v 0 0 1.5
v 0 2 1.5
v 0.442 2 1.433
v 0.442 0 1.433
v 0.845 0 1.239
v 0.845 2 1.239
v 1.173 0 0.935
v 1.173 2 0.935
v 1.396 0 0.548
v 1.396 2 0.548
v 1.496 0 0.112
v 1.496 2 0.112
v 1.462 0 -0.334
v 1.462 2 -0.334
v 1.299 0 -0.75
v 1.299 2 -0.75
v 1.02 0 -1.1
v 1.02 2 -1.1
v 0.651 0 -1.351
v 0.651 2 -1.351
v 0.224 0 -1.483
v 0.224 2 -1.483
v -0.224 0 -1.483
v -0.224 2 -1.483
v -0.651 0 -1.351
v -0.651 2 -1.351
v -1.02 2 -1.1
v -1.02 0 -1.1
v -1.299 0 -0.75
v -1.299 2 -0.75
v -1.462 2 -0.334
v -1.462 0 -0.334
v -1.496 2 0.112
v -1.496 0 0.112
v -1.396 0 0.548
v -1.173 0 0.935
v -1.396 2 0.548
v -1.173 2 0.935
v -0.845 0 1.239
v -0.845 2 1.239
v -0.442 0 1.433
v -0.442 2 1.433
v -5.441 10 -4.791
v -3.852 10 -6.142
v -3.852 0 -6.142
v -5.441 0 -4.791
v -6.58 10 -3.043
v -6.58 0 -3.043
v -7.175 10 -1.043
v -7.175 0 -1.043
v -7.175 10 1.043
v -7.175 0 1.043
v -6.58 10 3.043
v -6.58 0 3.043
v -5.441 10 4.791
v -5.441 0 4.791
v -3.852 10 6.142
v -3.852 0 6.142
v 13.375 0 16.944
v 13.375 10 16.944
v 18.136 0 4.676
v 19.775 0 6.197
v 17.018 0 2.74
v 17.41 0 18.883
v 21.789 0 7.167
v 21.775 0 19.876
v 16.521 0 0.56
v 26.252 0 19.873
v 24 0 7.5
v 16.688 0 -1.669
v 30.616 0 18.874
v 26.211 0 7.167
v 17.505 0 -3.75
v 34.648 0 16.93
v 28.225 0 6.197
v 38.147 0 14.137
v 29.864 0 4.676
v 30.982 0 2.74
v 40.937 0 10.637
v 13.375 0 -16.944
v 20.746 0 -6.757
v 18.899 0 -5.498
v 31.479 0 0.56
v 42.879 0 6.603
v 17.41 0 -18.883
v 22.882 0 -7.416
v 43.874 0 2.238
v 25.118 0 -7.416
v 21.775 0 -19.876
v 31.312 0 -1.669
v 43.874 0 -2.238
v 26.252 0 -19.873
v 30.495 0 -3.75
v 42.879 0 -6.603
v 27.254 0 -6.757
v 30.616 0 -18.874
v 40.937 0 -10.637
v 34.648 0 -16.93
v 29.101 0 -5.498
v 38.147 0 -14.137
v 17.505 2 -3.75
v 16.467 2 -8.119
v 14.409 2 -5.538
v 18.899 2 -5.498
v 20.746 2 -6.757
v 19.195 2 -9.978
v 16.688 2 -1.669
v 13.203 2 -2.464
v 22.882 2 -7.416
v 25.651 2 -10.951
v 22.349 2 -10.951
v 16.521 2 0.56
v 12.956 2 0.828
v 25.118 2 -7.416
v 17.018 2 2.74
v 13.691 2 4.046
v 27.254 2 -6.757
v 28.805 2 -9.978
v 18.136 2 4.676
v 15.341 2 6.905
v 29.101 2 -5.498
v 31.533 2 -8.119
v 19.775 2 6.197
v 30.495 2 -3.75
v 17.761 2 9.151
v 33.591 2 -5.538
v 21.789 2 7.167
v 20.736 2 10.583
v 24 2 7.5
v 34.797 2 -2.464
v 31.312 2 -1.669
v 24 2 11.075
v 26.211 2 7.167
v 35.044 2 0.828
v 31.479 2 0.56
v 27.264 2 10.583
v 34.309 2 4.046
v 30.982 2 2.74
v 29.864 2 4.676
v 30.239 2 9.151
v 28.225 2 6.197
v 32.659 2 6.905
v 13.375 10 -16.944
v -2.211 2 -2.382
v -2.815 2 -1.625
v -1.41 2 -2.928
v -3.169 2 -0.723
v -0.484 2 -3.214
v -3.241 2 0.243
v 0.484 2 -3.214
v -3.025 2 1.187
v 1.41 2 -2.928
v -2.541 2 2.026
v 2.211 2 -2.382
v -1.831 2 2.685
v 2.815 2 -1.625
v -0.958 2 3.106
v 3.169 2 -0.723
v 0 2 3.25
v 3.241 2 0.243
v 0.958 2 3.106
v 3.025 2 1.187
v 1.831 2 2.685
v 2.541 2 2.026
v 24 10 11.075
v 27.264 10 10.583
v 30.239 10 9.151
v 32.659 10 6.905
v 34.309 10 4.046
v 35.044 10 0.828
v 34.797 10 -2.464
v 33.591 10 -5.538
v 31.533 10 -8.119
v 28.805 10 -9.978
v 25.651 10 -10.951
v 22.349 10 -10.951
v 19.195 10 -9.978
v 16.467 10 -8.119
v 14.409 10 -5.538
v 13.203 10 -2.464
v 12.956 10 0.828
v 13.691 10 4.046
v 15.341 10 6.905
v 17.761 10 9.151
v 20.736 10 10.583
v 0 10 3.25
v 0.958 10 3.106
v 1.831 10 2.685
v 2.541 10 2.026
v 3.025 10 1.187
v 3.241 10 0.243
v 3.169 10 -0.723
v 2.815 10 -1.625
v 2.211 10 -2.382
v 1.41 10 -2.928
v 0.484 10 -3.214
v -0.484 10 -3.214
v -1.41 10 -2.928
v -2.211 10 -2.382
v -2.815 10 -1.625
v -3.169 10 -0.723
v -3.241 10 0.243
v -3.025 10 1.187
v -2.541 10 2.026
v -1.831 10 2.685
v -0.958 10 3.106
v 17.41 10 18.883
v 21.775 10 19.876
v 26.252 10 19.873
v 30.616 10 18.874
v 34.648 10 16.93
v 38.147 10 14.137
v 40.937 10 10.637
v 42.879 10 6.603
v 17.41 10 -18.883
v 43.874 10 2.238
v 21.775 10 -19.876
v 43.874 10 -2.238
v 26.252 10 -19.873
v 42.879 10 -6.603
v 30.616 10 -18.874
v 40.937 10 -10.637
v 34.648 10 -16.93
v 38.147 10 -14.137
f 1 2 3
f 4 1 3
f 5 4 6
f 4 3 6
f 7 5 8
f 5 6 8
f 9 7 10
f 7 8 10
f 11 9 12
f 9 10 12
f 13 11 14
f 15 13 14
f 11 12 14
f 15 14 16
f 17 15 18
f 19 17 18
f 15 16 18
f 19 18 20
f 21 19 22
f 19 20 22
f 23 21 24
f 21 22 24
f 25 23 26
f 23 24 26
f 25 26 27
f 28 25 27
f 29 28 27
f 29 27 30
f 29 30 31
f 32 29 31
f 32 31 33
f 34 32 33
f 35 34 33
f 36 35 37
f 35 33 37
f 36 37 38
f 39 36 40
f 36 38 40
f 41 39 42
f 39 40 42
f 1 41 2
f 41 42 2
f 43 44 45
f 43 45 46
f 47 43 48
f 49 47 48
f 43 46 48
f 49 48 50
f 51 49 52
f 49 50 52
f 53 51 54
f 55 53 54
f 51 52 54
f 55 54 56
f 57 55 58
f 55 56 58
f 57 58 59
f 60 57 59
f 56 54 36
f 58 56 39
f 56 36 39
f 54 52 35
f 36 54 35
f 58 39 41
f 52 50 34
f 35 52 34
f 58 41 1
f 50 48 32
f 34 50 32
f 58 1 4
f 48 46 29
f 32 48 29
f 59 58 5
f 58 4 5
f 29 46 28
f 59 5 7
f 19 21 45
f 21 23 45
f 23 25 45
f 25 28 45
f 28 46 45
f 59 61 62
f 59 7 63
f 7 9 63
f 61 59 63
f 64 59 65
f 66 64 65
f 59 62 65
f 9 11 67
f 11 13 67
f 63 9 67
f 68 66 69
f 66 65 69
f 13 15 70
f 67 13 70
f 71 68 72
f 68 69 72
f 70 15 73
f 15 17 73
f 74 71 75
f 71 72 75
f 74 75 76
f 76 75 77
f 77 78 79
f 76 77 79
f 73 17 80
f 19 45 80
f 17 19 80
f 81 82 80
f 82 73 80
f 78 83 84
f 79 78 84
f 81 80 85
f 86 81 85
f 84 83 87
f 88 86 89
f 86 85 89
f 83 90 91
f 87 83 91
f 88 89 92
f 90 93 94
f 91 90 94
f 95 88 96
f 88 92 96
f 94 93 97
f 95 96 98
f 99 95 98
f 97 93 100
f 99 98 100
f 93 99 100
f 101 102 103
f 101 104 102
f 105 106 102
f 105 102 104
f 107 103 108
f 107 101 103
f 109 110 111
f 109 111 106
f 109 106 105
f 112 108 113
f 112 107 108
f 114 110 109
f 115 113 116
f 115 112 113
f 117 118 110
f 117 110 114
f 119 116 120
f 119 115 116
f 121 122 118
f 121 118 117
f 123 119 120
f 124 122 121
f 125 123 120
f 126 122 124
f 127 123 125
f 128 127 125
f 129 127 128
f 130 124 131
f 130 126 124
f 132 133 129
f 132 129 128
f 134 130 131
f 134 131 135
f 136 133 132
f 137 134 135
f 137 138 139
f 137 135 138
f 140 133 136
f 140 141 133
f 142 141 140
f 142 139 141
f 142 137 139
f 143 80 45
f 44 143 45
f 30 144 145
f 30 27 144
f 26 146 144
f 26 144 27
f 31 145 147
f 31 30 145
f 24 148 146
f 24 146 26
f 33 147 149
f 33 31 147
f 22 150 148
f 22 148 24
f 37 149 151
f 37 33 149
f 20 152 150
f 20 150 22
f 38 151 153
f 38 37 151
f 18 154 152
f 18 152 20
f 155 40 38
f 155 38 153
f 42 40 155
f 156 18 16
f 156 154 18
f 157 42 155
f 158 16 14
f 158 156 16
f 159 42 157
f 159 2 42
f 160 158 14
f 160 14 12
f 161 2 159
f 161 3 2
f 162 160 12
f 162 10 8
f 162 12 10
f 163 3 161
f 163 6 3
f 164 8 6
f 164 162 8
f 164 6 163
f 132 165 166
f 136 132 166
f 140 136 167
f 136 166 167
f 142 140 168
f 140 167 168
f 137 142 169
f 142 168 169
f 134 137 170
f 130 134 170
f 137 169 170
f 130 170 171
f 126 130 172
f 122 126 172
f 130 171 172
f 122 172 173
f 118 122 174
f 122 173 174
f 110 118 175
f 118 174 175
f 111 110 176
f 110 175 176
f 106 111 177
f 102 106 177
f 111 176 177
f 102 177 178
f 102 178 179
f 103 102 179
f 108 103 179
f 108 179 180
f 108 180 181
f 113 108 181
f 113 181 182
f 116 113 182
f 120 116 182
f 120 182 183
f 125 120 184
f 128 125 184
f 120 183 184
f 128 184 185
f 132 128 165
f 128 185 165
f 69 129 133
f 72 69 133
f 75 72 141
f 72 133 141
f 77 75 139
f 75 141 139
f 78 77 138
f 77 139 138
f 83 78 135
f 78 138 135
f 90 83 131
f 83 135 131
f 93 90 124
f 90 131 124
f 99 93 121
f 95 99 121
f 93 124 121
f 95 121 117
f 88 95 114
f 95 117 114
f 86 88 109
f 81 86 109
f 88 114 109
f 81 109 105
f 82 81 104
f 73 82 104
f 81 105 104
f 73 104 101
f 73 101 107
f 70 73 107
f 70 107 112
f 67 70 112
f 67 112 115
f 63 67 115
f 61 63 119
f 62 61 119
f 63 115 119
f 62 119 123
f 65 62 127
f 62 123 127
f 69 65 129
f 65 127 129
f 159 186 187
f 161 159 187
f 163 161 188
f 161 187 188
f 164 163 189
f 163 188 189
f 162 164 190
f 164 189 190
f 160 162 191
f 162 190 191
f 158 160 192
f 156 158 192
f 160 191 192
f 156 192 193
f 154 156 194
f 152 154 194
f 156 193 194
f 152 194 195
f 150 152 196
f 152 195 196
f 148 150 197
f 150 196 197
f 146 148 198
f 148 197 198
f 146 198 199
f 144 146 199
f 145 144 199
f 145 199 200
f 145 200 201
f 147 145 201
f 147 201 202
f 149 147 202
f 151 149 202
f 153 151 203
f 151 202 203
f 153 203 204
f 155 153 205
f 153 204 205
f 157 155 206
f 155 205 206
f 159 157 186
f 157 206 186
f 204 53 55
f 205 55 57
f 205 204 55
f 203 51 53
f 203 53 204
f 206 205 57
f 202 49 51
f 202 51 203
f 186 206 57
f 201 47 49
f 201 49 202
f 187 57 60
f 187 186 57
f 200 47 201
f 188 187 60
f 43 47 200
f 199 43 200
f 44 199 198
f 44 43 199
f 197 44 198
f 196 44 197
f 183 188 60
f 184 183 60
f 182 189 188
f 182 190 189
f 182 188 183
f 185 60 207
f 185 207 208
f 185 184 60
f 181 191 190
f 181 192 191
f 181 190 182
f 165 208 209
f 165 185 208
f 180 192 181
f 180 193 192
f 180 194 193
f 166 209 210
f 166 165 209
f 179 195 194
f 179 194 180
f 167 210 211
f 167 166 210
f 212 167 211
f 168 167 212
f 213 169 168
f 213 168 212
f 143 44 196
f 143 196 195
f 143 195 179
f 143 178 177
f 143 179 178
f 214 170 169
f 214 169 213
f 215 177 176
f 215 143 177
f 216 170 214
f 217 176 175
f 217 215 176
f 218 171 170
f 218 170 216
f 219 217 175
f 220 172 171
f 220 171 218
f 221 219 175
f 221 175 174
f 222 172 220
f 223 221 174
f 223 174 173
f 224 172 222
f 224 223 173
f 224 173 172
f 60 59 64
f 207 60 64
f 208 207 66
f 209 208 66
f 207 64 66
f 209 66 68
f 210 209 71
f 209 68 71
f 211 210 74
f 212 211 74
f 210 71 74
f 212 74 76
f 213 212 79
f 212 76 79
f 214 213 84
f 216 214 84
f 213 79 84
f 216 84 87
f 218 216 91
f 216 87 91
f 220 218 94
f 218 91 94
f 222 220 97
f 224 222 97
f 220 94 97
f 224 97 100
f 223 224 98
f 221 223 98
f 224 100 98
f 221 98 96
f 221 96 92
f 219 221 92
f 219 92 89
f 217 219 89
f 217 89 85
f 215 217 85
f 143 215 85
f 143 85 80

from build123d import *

# Parameters (mm, degrees)
AUFSATZ_LINEAR_AUSTRAGEN1_DEPTH = 10
SKIZZE2_R                       = 3.25
SKIZZE2_R_2                     = 11.075
SCHNITT_LINEAR_AUSTRAGEN1_DEPTH = 8
SKIZZE3_R                       = 7.5
SKIZZE3_R_2                     = 1.5
SCHNITT_LINEAR_AUSTRAGEN2_DEPTH = 2


with BuildPart() as part:
    # Skizze1 → Aufsatz-Linear austragen1 (new body)
    with BuildSketch(Plane(origin=(0, 0, 0), x_dir=(1, 0, 0), z_dir=(0, 1, 0))):
        with BuildLine():
            Line((-3.8515625, -6.142309526), (13.375, -16.94430214))
            ThreePointArc((13.375, -16.94430214), (44, 0), (13.375, 16.94430214))
            Line((13.375, 16.94430214), (-3.8515625, 6.142309526))
            ThreePointArc((-3.8515625, 6.142309526), (-7.25, 0), (-3.8515625, -6.142309526))
        make_face()
    extrude(amount=AUFSATZ_LINEAR_AUSTRAGEN1_DEPTH)

    # Skizze2 → Schnitt-Linear austragen1 (cut)
    with BuildSketch(Plane(origin=(0, 10, 0), x_dir=(1, 0, 0), z_dir=(0, 1, 0))):
        with Locations(Location((0, 0, 0), (0, 0, 270))):
            Circle(SKIZZE2_R)
        with Locations(Location((24, 0, 0), (0, 0, 270))):
            Circle(SKIZZE2_R_2)
    extrude(amount=-SCHNITT_LINEAR_AUSTRAGEN1_DEPTH, mode=Mode.SUBTRACT)

    # Skizze3 → Schnitt-Linear austragen2 (cut)
    with BuildSketch(Plane(origin=(0, 2, 0), x_dir=(1, 0, 0), z_dir=(0, 1, 0))):
        with Locations(Location((24, 0, 0), (0, 0, 270))):
            Circle(SKIZZE3_R)
        with Locations(Location((0, 0, 0), (0, 0, 270))):
            Circle(SKIZZE3_R_2)
    extrude(amount=-SCHNITT_LINEAR_AUSTRAGEN2_DEPTH, mode=Mode.SUBTRACT)


solid = part.part
